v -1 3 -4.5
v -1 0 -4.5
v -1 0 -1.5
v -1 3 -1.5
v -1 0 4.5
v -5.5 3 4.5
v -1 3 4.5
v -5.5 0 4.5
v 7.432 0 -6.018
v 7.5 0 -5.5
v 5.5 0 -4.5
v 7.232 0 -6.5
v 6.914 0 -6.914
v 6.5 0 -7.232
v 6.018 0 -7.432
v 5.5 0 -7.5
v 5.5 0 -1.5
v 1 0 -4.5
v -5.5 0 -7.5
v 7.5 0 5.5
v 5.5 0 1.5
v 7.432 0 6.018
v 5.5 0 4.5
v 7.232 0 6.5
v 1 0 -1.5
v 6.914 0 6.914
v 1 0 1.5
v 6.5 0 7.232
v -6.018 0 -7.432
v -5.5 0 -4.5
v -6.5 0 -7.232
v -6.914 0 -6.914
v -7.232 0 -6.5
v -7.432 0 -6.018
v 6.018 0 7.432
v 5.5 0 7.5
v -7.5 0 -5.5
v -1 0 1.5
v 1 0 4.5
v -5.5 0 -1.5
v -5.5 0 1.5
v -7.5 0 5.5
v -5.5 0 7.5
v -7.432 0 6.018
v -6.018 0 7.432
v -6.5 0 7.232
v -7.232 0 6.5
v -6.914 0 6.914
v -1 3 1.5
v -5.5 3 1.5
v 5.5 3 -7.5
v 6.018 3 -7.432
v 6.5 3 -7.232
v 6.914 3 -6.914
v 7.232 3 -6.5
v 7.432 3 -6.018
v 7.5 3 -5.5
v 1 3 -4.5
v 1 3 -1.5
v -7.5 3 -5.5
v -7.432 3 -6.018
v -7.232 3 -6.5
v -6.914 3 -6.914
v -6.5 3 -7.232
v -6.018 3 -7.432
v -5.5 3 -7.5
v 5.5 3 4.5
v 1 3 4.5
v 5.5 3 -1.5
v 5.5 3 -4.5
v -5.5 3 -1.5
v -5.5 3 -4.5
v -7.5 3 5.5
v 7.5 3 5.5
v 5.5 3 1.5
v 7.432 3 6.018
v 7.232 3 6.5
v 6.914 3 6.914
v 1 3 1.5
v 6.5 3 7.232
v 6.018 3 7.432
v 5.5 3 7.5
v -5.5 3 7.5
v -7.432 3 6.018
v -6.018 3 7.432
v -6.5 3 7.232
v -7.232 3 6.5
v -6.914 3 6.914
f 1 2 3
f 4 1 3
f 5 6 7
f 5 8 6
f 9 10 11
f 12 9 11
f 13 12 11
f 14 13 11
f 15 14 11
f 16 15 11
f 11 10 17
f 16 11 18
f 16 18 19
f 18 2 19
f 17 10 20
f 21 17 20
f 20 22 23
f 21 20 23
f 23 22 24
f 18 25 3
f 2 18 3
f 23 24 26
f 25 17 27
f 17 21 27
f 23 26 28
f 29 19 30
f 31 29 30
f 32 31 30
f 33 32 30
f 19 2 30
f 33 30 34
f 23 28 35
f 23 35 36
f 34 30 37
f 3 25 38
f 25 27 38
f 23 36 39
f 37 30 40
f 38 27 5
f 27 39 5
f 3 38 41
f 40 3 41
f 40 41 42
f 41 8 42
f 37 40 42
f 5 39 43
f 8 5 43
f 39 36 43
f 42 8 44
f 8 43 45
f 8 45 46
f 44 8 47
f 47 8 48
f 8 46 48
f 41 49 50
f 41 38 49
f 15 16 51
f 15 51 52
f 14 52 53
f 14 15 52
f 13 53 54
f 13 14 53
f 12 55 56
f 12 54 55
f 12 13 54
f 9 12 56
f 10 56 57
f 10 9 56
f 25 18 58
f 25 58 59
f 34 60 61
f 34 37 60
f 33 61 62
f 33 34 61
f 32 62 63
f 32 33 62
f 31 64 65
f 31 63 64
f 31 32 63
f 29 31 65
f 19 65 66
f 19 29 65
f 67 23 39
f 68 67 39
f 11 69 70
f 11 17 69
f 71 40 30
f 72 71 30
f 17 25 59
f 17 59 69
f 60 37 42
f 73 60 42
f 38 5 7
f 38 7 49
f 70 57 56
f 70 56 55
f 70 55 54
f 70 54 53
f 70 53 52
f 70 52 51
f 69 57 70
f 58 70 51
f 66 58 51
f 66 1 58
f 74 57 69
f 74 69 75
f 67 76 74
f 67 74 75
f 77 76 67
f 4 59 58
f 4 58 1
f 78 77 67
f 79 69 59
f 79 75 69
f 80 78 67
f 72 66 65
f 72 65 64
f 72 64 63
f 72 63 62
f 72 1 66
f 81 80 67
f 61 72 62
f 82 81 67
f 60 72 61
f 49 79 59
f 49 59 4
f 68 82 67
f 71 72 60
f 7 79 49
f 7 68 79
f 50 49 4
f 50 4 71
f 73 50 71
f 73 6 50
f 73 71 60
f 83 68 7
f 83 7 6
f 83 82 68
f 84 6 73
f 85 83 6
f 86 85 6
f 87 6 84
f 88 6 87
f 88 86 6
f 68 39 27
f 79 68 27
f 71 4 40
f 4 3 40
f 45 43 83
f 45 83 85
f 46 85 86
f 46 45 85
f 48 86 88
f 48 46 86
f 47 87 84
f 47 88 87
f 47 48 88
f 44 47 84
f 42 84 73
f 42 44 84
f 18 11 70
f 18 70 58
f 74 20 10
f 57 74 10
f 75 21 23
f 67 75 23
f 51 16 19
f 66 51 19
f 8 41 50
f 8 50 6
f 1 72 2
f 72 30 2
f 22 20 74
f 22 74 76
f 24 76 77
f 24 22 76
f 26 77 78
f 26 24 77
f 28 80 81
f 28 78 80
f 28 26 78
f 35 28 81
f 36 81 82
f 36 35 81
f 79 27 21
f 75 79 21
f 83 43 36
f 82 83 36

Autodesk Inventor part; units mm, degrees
ref_plane "YZ Plane" through (0, 0, 0) normal (1, 0, 0) x (0, 1, 0)
ref_plane "XZ Plane" through (0, 0, 0) normal (0, 1, 0) x (-1, 0, 0)
ref_plane "XY Plane" through (0, 0, 0) normal (0, 0, 1) x (1, 0, 0)
sketch "Sketch1" plane through (0, 0, 0) normal (0, 1, 0) x (-1, 0, 0)
  line L0 (5.5, 7.5) -> (-5.5, 7.5)
  line L1 (-7.5, 5.5) -> (-7.5, -5.5)
  line L2 (-5.5, -7.5) -> (5.5, -7.5)
  line L3 (7.5, -5.5) -> (7.5, 5.5)
  line L4 (7.5, 7.5) -> (-7.5, -7.5) construction
  line L5 (-7.5, 7.5) -> (7.5, -7.5) construction
  arc A0 (7.5, 5.5) -> (5.5, 7.5) centre (5.5, 5.5) ccw
  arc A1 (-5.5, 7.5) -> (-7.5, 5.5) centre (-5.5, 5.5) ccw
  arc A2 (-7.5, -5.5) -> (-5.5, -7.5) centre (-5.5, -5.5) ccw
  arc A3 (5.5, -7.5) -> (7.5, -5.5) centre (5.5, -5.5) ccw
  line L6 (5.5, 4.5) -> (1, 4.5)
  line L7 (1, 4.5) -> (1, 1.5)
  line L8 (1, 1.5) -> (5.5, 1.5)
  line L9 (5.5, 1.5) -> (5.5, 4.5)
  line L10 (3.25, 0) -> (5.1677, 0)
  line L11 (0, 3.1331) -> (0, 1.6822) construction
  line L12 (5.5, -4.5) -> (1, -4.5)
  line L13 (1, -4.5) -> (1, -1.5)
  line L14 (1, -1.5) -> (5.5, -1.5)
  line L15 (5.5, -1.5) -> (5.5, -4.5)
  line L16 (-5.5, 4.5) -> (-1, 4.5)
  line L17 (-1, 4.5) -> (-1, 1.5)
  line L18 (-1, 1.5) -> (-5.5, 1.5)
  line L19 (-5.5, 1.5) -> (-5.5, 4.5)
  line L20 (-1, -4.5) -> (-1, -1.5)
  line L21 (-1, -1.5) -> (-5.5, -1.5)
  line L22 (-5.5, -1.5) -> (-5.5, -4.5)
  line L23 (-5.5, -4.5) -> (-1, -4.5)
  point P0 (0, 0)
  point P1 (5.5, -5.5)
  dimension "d0" = 2
  dimension "d1" = 11
  dimension "d2" = 11
  dimension "d5" = 3
  dimension "d6" = 4.5
  dimension "d7" = 2
  dimension "d8" = 3
extrude "Extrusion1" add sketch "Sketch1" along normal blind 3
properties part number "horn_base"
